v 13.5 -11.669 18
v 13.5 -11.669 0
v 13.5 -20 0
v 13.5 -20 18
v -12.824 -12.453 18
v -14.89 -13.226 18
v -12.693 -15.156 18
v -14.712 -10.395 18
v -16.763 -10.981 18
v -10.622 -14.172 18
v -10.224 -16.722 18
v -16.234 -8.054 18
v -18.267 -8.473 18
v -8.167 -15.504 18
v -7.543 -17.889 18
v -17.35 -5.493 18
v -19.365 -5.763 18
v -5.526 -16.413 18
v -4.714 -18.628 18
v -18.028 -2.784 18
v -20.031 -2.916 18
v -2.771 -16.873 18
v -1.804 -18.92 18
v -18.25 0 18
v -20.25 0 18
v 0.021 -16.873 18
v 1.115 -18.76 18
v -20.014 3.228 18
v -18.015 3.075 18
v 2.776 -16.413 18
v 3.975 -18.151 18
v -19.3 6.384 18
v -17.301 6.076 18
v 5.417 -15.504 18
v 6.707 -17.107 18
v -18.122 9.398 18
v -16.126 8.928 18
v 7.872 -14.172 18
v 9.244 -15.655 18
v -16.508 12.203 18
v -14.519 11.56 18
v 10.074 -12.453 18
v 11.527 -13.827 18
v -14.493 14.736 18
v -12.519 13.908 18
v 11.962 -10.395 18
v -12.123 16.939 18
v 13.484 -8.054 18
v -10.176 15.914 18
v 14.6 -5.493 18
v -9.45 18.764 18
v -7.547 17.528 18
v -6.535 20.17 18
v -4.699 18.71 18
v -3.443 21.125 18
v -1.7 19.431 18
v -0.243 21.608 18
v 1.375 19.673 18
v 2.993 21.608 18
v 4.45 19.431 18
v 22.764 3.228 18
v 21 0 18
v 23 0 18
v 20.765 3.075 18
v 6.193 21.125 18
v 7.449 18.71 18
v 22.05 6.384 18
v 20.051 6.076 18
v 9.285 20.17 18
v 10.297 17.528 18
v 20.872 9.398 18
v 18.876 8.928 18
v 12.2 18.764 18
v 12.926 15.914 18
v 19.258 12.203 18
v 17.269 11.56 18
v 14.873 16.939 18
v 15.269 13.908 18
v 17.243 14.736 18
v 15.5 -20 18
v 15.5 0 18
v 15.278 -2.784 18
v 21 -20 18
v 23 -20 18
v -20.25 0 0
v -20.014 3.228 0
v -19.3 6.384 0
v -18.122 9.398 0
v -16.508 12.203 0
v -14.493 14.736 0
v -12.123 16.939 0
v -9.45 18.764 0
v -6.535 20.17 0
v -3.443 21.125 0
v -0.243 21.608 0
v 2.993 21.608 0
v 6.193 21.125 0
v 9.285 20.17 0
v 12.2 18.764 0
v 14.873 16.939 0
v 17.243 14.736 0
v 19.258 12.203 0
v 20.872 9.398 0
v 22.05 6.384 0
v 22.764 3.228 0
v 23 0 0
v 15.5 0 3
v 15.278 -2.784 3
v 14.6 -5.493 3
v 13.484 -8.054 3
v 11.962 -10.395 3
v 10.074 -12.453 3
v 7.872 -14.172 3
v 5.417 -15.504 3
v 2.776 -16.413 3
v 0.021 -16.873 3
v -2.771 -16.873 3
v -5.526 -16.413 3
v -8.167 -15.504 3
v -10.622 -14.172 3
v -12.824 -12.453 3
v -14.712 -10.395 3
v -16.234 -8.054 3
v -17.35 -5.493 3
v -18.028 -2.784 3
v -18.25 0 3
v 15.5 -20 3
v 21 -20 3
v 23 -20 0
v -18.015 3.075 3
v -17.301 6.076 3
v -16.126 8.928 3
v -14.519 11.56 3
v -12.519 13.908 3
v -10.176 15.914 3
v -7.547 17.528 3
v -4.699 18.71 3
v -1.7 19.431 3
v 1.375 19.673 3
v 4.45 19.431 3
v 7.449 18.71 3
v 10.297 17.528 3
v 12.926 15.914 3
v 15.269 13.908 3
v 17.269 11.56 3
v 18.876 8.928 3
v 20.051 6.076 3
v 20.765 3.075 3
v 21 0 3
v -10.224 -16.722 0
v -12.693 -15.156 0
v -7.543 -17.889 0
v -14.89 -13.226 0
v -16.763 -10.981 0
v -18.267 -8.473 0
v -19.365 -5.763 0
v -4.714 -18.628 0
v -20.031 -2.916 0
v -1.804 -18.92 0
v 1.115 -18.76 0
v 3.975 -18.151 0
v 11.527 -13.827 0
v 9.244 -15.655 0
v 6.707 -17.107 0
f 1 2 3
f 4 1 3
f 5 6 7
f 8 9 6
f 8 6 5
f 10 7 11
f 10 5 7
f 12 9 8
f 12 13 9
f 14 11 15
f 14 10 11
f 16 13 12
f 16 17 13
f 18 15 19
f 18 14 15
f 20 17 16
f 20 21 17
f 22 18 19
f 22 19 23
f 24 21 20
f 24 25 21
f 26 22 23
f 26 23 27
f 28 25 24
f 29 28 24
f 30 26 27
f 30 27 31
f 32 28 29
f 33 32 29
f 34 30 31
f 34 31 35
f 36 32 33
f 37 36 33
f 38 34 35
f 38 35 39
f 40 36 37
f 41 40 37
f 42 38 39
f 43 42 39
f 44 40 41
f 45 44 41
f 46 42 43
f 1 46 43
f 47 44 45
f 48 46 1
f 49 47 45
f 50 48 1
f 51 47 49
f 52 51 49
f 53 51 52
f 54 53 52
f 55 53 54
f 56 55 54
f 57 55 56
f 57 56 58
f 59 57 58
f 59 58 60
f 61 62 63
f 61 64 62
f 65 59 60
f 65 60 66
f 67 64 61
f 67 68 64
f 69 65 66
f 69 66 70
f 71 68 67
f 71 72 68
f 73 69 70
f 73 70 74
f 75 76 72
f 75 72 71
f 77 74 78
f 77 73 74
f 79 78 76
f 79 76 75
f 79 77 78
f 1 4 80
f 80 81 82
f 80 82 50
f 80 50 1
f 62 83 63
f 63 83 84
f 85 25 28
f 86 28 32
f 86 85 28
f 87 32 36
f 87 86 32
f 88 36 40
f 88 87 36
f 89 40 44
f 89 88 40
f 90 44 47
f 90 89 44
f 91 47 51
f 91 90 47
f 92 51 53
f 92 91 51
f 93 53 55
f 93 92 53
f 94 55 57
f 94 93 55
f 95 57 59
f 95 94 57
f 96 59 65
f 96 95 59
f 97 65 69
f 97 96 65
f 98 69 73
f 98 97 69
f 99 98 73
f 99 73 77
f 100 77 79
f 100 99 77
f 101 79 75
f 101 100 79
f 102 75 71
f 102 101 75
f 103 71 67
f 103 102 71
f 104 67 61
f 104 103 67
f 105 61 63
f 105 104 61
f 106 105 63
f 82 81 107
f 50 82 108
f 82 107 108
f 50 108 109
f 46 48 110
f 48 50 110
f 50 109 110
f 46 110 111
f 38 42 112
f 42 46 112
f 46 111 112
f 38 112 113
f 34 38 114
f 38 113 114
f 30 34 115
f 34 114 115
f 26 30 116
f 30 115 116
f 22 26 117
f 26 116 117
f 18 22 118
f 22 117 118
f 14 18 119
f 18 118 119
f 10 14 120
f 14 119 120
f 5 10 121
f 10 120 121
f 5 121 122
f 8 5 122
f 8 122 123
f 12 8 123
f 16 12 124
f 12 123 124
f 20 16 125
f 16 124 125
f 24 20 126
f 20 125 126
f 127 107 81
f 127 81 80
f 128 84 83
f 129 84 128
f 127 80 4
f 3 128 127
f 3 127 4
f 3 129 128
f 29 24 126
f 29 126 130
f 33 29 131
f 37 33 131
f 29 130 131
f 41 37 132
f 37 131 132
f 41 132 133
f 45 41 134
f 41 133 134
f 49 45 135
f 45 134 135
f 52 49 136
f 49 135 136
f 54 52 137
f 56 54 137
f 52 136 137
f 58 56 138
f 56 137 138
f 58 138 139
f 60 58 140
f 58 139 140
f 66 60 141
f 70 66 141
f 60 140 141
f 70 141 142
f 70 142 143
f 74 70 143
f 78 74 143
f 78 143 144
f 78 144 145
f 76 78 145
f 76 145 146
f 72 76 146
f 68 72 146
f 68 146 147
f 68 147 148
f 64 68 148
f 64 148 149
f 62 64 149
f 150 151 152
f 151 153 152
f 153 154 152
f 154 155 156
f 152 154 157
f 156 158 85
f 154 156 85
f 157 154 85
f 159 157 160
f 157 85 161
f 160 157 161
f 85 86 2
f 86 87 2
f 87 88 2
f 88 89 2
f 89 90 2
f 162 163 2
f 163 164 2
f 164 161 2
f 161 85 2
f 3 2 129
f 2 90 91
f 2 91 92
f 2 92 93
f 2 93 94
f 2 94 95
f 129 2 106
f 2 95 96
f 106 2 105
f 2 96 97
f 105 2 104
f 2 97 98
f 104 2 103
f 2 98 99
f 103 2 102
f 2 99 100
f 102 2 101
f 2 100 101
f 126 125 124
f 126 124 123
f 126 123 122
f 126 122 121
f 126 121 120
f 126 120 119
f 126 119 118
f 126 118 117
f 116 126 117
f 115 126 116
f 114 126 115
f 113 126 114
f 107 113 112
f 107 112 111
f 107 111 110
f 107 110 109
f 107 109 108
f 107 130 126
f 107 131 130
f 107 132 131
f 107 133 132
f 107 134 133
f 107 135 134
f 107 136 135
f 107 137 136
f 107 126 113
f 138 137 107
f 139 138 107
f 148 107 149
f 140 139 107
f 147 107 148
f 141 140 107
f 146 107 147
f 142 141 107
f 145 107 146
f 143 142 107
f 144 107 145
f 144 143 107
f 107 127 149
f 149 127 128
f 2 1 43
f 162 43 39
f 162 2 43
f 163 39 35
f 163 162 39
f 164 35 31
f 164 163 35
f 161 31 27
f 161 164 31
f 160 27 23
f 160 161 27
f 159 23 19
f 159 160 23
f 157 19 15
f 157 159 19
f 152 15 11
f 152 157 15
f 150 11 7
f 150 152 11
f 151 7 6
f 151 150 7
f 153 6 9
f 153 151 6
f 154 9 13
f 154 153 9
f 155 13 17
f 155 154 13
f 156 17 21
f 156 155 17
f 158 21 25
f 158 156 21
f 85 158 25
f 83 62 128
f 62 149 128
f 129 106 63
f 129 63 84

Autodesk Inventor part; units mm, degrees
ref_plane "YZ Plane" through (0, 0, 0) normal (1, 0, 0) x (0, 1, 0)
ref_plane "XZ Plane" through (0, 0, 0) normal (0, 1, 0) x (-1, 0, 0)
ref_plane "XY Plane" through (0, 0, 0) normal (0, 0, 1) x (1, 0, 0)
ref_plane "Work Plane1" through (0, 0, 0) normal (0, 0, 1) x (1, 0, 0)
sketch "Sketch1" plane through (0, 0, 0) normal (0, 0, 1) x (1, 0, 0)
  line L0 (0, 0) -> (21, 0)
  line L1 (15.5, 0) -> (15.5, -20)
  circle A0 centre (0, 0) radius 15.5
  line L2 (0, 0) -> (14.0478, -6.5506)
  line L3 (0, 0) -> (0, -16.875)
  line L4 (0, 0) -> (-18.25, 0)
  line L5 (0, 0) -> (0, 19.625)
  arc A1 (-18.25, 0) -> (15.5, 0) centre (-1.375, -0.056) ccw
  arc A2 (21, 0) -> (-18.25, 0) centre (1.375, 0.0482) ccw
  line L6 (21, 0) -> (21, -20)
  line L7 (0, 0) -> (0, -18.875)
  line L8 (0, 0) -> (-20.25, 0)
  line L9 (0, 0) -> (0, 21.625)
  line L10 (0, 0) -> (23, 0)
  line L11 (0, 0) -> (17.5, 0)
  arc A3 (-20.25, 0) -> (17.5, 0) centre (-1.375, -0.0501) ccw
  arc A4 (23, 0) -> (-20.25, 0) centre (1.375, 0.0437) ccw
  line L12 (13.5, -8.0249) -> (13.5, -20)
  line L13 (15.5, -20) -> (13.5, -20)
  line L14 (23, 0) -> (23, -20)
  line L15 (21, -20) -> (23, -20)
  line L16 (21, -20) -> (15.5, -20)
  point P0 (15.5, -8.506)
  point P1 (15.5, -0.112)
  point P2 (21, 0)
  point P3 (13.5, -14.0125)
  point P4 (13.5, -11.6691)
  dimension "d2" = 31
  dimension "d0" = 21
  dimension "d1" = 15.5
  dimension "d3" = 25
  dimension "d4" = 16.875
  dimension "d5" = 18.25
  dimension "d6" = 19.625
  dimension "d7" = 20
  dimension "d8" = 20
  dimension "d9" = 2
  dimension "d10" = 2
  dimension "d11" = 2
  dimension "d12" = 2
  dimension "d13" = 2
  dimension "d16" = 2
extrude "Extrusion1" add sketch "Sketch1" along normal blind 18 contours L1 A3 L12 A1 | L1 L13 L12 A3 | L12 A3 L7 A1 | L7 A3 L8 A1 | L8 A4 L9 A2 | L9 A4 L10 A2 | L10 L14 L15 L6
extrude "Extrusion2" add sketch "Sketch1" along normal blind 3 contours L5 A0 L0 | L0 A0 L2 | L2 A0 L3 | L3 A0 L4 | L4 A0 L5 | A0 L5 A2 L0 | L0 A3 L1 | A1 L3 A0 | L3 A1 L4 A0 | L4 A2 L5 A0 | L0 L6 L16 L1 A3
sketch "Sketch2" plane through (13.5, -20, 0) normal (0, -1, 0) x (1, 0, 0)
  circle A0 centre (4.7788, 10.8992) radius 2.75
  point P0 (-13.5, 0)
  dimension "d19" = 5.5
equation "\"d2\" = VoluteCaseInnerSize"
equation "\"d0\" = 0.5 * VoluteCaseOuterSize"
equation "\"d1\" = 0.5 * VoluteCaseInnerSize"
equation "\"d3\" = VoluteStartAngle"
equation "\"d4\" = 0.375 * VoluteCaseInnerSize + 0.125 * VoluteCaseOuterSize"
equation "\"d5\" = 0.25 * VoluteCaseInnerSize + 0.25 * VoluteCaseOuterSize"
equation "\"d6\" = 0.125 * VoluteCaseInnerSize + 0.375 * VoluteCaseOuterSize"
equation "\"d7\" = VoluteOutletLength"
equation "\"d8\" = VoluteOutletLength"
equation "\"d9\" = VoluteWallThickness"
equation "\"d10\" = VoluteWallThickness"
equation "\"d11\" = VoluteWallThickness"
equation "\"d12\" = VoluteWallThickness"
equation "\"d13\" = VoluteWallThickness"
equation "\"d16\" = VoluteWallThickness"
equation "\"d14\" = VoluteBaseWallThickness + VoluteWallDepth"
equation "\"d17\" = VoluteBaseWallThickness"
equation "\"d19\" = OutletRadius"
equation "\"PropHoleDiameter\" = 8.2"
equation "\"PropBladeThickness\" = 1"
equation "\"PropPlateThickness\" = 2"
equation "\"VoluteCaseInnerSize\" = 31"
equation "\"VoluteCaseOuterSize\" = 42"
equation "\"VoluteWallThickness\" = 2"
equation "\"VoluteStartAngle\" = 25deg"
equation "\"VoluteOutletLength\" = 20"
equation "\"VoluteBaseWallThickness\" = 3"
equation "\"VoluteWallDepth\" = 15"
equation "\"OutletRadius\" = 5.5"
properties part number "volute_case"
